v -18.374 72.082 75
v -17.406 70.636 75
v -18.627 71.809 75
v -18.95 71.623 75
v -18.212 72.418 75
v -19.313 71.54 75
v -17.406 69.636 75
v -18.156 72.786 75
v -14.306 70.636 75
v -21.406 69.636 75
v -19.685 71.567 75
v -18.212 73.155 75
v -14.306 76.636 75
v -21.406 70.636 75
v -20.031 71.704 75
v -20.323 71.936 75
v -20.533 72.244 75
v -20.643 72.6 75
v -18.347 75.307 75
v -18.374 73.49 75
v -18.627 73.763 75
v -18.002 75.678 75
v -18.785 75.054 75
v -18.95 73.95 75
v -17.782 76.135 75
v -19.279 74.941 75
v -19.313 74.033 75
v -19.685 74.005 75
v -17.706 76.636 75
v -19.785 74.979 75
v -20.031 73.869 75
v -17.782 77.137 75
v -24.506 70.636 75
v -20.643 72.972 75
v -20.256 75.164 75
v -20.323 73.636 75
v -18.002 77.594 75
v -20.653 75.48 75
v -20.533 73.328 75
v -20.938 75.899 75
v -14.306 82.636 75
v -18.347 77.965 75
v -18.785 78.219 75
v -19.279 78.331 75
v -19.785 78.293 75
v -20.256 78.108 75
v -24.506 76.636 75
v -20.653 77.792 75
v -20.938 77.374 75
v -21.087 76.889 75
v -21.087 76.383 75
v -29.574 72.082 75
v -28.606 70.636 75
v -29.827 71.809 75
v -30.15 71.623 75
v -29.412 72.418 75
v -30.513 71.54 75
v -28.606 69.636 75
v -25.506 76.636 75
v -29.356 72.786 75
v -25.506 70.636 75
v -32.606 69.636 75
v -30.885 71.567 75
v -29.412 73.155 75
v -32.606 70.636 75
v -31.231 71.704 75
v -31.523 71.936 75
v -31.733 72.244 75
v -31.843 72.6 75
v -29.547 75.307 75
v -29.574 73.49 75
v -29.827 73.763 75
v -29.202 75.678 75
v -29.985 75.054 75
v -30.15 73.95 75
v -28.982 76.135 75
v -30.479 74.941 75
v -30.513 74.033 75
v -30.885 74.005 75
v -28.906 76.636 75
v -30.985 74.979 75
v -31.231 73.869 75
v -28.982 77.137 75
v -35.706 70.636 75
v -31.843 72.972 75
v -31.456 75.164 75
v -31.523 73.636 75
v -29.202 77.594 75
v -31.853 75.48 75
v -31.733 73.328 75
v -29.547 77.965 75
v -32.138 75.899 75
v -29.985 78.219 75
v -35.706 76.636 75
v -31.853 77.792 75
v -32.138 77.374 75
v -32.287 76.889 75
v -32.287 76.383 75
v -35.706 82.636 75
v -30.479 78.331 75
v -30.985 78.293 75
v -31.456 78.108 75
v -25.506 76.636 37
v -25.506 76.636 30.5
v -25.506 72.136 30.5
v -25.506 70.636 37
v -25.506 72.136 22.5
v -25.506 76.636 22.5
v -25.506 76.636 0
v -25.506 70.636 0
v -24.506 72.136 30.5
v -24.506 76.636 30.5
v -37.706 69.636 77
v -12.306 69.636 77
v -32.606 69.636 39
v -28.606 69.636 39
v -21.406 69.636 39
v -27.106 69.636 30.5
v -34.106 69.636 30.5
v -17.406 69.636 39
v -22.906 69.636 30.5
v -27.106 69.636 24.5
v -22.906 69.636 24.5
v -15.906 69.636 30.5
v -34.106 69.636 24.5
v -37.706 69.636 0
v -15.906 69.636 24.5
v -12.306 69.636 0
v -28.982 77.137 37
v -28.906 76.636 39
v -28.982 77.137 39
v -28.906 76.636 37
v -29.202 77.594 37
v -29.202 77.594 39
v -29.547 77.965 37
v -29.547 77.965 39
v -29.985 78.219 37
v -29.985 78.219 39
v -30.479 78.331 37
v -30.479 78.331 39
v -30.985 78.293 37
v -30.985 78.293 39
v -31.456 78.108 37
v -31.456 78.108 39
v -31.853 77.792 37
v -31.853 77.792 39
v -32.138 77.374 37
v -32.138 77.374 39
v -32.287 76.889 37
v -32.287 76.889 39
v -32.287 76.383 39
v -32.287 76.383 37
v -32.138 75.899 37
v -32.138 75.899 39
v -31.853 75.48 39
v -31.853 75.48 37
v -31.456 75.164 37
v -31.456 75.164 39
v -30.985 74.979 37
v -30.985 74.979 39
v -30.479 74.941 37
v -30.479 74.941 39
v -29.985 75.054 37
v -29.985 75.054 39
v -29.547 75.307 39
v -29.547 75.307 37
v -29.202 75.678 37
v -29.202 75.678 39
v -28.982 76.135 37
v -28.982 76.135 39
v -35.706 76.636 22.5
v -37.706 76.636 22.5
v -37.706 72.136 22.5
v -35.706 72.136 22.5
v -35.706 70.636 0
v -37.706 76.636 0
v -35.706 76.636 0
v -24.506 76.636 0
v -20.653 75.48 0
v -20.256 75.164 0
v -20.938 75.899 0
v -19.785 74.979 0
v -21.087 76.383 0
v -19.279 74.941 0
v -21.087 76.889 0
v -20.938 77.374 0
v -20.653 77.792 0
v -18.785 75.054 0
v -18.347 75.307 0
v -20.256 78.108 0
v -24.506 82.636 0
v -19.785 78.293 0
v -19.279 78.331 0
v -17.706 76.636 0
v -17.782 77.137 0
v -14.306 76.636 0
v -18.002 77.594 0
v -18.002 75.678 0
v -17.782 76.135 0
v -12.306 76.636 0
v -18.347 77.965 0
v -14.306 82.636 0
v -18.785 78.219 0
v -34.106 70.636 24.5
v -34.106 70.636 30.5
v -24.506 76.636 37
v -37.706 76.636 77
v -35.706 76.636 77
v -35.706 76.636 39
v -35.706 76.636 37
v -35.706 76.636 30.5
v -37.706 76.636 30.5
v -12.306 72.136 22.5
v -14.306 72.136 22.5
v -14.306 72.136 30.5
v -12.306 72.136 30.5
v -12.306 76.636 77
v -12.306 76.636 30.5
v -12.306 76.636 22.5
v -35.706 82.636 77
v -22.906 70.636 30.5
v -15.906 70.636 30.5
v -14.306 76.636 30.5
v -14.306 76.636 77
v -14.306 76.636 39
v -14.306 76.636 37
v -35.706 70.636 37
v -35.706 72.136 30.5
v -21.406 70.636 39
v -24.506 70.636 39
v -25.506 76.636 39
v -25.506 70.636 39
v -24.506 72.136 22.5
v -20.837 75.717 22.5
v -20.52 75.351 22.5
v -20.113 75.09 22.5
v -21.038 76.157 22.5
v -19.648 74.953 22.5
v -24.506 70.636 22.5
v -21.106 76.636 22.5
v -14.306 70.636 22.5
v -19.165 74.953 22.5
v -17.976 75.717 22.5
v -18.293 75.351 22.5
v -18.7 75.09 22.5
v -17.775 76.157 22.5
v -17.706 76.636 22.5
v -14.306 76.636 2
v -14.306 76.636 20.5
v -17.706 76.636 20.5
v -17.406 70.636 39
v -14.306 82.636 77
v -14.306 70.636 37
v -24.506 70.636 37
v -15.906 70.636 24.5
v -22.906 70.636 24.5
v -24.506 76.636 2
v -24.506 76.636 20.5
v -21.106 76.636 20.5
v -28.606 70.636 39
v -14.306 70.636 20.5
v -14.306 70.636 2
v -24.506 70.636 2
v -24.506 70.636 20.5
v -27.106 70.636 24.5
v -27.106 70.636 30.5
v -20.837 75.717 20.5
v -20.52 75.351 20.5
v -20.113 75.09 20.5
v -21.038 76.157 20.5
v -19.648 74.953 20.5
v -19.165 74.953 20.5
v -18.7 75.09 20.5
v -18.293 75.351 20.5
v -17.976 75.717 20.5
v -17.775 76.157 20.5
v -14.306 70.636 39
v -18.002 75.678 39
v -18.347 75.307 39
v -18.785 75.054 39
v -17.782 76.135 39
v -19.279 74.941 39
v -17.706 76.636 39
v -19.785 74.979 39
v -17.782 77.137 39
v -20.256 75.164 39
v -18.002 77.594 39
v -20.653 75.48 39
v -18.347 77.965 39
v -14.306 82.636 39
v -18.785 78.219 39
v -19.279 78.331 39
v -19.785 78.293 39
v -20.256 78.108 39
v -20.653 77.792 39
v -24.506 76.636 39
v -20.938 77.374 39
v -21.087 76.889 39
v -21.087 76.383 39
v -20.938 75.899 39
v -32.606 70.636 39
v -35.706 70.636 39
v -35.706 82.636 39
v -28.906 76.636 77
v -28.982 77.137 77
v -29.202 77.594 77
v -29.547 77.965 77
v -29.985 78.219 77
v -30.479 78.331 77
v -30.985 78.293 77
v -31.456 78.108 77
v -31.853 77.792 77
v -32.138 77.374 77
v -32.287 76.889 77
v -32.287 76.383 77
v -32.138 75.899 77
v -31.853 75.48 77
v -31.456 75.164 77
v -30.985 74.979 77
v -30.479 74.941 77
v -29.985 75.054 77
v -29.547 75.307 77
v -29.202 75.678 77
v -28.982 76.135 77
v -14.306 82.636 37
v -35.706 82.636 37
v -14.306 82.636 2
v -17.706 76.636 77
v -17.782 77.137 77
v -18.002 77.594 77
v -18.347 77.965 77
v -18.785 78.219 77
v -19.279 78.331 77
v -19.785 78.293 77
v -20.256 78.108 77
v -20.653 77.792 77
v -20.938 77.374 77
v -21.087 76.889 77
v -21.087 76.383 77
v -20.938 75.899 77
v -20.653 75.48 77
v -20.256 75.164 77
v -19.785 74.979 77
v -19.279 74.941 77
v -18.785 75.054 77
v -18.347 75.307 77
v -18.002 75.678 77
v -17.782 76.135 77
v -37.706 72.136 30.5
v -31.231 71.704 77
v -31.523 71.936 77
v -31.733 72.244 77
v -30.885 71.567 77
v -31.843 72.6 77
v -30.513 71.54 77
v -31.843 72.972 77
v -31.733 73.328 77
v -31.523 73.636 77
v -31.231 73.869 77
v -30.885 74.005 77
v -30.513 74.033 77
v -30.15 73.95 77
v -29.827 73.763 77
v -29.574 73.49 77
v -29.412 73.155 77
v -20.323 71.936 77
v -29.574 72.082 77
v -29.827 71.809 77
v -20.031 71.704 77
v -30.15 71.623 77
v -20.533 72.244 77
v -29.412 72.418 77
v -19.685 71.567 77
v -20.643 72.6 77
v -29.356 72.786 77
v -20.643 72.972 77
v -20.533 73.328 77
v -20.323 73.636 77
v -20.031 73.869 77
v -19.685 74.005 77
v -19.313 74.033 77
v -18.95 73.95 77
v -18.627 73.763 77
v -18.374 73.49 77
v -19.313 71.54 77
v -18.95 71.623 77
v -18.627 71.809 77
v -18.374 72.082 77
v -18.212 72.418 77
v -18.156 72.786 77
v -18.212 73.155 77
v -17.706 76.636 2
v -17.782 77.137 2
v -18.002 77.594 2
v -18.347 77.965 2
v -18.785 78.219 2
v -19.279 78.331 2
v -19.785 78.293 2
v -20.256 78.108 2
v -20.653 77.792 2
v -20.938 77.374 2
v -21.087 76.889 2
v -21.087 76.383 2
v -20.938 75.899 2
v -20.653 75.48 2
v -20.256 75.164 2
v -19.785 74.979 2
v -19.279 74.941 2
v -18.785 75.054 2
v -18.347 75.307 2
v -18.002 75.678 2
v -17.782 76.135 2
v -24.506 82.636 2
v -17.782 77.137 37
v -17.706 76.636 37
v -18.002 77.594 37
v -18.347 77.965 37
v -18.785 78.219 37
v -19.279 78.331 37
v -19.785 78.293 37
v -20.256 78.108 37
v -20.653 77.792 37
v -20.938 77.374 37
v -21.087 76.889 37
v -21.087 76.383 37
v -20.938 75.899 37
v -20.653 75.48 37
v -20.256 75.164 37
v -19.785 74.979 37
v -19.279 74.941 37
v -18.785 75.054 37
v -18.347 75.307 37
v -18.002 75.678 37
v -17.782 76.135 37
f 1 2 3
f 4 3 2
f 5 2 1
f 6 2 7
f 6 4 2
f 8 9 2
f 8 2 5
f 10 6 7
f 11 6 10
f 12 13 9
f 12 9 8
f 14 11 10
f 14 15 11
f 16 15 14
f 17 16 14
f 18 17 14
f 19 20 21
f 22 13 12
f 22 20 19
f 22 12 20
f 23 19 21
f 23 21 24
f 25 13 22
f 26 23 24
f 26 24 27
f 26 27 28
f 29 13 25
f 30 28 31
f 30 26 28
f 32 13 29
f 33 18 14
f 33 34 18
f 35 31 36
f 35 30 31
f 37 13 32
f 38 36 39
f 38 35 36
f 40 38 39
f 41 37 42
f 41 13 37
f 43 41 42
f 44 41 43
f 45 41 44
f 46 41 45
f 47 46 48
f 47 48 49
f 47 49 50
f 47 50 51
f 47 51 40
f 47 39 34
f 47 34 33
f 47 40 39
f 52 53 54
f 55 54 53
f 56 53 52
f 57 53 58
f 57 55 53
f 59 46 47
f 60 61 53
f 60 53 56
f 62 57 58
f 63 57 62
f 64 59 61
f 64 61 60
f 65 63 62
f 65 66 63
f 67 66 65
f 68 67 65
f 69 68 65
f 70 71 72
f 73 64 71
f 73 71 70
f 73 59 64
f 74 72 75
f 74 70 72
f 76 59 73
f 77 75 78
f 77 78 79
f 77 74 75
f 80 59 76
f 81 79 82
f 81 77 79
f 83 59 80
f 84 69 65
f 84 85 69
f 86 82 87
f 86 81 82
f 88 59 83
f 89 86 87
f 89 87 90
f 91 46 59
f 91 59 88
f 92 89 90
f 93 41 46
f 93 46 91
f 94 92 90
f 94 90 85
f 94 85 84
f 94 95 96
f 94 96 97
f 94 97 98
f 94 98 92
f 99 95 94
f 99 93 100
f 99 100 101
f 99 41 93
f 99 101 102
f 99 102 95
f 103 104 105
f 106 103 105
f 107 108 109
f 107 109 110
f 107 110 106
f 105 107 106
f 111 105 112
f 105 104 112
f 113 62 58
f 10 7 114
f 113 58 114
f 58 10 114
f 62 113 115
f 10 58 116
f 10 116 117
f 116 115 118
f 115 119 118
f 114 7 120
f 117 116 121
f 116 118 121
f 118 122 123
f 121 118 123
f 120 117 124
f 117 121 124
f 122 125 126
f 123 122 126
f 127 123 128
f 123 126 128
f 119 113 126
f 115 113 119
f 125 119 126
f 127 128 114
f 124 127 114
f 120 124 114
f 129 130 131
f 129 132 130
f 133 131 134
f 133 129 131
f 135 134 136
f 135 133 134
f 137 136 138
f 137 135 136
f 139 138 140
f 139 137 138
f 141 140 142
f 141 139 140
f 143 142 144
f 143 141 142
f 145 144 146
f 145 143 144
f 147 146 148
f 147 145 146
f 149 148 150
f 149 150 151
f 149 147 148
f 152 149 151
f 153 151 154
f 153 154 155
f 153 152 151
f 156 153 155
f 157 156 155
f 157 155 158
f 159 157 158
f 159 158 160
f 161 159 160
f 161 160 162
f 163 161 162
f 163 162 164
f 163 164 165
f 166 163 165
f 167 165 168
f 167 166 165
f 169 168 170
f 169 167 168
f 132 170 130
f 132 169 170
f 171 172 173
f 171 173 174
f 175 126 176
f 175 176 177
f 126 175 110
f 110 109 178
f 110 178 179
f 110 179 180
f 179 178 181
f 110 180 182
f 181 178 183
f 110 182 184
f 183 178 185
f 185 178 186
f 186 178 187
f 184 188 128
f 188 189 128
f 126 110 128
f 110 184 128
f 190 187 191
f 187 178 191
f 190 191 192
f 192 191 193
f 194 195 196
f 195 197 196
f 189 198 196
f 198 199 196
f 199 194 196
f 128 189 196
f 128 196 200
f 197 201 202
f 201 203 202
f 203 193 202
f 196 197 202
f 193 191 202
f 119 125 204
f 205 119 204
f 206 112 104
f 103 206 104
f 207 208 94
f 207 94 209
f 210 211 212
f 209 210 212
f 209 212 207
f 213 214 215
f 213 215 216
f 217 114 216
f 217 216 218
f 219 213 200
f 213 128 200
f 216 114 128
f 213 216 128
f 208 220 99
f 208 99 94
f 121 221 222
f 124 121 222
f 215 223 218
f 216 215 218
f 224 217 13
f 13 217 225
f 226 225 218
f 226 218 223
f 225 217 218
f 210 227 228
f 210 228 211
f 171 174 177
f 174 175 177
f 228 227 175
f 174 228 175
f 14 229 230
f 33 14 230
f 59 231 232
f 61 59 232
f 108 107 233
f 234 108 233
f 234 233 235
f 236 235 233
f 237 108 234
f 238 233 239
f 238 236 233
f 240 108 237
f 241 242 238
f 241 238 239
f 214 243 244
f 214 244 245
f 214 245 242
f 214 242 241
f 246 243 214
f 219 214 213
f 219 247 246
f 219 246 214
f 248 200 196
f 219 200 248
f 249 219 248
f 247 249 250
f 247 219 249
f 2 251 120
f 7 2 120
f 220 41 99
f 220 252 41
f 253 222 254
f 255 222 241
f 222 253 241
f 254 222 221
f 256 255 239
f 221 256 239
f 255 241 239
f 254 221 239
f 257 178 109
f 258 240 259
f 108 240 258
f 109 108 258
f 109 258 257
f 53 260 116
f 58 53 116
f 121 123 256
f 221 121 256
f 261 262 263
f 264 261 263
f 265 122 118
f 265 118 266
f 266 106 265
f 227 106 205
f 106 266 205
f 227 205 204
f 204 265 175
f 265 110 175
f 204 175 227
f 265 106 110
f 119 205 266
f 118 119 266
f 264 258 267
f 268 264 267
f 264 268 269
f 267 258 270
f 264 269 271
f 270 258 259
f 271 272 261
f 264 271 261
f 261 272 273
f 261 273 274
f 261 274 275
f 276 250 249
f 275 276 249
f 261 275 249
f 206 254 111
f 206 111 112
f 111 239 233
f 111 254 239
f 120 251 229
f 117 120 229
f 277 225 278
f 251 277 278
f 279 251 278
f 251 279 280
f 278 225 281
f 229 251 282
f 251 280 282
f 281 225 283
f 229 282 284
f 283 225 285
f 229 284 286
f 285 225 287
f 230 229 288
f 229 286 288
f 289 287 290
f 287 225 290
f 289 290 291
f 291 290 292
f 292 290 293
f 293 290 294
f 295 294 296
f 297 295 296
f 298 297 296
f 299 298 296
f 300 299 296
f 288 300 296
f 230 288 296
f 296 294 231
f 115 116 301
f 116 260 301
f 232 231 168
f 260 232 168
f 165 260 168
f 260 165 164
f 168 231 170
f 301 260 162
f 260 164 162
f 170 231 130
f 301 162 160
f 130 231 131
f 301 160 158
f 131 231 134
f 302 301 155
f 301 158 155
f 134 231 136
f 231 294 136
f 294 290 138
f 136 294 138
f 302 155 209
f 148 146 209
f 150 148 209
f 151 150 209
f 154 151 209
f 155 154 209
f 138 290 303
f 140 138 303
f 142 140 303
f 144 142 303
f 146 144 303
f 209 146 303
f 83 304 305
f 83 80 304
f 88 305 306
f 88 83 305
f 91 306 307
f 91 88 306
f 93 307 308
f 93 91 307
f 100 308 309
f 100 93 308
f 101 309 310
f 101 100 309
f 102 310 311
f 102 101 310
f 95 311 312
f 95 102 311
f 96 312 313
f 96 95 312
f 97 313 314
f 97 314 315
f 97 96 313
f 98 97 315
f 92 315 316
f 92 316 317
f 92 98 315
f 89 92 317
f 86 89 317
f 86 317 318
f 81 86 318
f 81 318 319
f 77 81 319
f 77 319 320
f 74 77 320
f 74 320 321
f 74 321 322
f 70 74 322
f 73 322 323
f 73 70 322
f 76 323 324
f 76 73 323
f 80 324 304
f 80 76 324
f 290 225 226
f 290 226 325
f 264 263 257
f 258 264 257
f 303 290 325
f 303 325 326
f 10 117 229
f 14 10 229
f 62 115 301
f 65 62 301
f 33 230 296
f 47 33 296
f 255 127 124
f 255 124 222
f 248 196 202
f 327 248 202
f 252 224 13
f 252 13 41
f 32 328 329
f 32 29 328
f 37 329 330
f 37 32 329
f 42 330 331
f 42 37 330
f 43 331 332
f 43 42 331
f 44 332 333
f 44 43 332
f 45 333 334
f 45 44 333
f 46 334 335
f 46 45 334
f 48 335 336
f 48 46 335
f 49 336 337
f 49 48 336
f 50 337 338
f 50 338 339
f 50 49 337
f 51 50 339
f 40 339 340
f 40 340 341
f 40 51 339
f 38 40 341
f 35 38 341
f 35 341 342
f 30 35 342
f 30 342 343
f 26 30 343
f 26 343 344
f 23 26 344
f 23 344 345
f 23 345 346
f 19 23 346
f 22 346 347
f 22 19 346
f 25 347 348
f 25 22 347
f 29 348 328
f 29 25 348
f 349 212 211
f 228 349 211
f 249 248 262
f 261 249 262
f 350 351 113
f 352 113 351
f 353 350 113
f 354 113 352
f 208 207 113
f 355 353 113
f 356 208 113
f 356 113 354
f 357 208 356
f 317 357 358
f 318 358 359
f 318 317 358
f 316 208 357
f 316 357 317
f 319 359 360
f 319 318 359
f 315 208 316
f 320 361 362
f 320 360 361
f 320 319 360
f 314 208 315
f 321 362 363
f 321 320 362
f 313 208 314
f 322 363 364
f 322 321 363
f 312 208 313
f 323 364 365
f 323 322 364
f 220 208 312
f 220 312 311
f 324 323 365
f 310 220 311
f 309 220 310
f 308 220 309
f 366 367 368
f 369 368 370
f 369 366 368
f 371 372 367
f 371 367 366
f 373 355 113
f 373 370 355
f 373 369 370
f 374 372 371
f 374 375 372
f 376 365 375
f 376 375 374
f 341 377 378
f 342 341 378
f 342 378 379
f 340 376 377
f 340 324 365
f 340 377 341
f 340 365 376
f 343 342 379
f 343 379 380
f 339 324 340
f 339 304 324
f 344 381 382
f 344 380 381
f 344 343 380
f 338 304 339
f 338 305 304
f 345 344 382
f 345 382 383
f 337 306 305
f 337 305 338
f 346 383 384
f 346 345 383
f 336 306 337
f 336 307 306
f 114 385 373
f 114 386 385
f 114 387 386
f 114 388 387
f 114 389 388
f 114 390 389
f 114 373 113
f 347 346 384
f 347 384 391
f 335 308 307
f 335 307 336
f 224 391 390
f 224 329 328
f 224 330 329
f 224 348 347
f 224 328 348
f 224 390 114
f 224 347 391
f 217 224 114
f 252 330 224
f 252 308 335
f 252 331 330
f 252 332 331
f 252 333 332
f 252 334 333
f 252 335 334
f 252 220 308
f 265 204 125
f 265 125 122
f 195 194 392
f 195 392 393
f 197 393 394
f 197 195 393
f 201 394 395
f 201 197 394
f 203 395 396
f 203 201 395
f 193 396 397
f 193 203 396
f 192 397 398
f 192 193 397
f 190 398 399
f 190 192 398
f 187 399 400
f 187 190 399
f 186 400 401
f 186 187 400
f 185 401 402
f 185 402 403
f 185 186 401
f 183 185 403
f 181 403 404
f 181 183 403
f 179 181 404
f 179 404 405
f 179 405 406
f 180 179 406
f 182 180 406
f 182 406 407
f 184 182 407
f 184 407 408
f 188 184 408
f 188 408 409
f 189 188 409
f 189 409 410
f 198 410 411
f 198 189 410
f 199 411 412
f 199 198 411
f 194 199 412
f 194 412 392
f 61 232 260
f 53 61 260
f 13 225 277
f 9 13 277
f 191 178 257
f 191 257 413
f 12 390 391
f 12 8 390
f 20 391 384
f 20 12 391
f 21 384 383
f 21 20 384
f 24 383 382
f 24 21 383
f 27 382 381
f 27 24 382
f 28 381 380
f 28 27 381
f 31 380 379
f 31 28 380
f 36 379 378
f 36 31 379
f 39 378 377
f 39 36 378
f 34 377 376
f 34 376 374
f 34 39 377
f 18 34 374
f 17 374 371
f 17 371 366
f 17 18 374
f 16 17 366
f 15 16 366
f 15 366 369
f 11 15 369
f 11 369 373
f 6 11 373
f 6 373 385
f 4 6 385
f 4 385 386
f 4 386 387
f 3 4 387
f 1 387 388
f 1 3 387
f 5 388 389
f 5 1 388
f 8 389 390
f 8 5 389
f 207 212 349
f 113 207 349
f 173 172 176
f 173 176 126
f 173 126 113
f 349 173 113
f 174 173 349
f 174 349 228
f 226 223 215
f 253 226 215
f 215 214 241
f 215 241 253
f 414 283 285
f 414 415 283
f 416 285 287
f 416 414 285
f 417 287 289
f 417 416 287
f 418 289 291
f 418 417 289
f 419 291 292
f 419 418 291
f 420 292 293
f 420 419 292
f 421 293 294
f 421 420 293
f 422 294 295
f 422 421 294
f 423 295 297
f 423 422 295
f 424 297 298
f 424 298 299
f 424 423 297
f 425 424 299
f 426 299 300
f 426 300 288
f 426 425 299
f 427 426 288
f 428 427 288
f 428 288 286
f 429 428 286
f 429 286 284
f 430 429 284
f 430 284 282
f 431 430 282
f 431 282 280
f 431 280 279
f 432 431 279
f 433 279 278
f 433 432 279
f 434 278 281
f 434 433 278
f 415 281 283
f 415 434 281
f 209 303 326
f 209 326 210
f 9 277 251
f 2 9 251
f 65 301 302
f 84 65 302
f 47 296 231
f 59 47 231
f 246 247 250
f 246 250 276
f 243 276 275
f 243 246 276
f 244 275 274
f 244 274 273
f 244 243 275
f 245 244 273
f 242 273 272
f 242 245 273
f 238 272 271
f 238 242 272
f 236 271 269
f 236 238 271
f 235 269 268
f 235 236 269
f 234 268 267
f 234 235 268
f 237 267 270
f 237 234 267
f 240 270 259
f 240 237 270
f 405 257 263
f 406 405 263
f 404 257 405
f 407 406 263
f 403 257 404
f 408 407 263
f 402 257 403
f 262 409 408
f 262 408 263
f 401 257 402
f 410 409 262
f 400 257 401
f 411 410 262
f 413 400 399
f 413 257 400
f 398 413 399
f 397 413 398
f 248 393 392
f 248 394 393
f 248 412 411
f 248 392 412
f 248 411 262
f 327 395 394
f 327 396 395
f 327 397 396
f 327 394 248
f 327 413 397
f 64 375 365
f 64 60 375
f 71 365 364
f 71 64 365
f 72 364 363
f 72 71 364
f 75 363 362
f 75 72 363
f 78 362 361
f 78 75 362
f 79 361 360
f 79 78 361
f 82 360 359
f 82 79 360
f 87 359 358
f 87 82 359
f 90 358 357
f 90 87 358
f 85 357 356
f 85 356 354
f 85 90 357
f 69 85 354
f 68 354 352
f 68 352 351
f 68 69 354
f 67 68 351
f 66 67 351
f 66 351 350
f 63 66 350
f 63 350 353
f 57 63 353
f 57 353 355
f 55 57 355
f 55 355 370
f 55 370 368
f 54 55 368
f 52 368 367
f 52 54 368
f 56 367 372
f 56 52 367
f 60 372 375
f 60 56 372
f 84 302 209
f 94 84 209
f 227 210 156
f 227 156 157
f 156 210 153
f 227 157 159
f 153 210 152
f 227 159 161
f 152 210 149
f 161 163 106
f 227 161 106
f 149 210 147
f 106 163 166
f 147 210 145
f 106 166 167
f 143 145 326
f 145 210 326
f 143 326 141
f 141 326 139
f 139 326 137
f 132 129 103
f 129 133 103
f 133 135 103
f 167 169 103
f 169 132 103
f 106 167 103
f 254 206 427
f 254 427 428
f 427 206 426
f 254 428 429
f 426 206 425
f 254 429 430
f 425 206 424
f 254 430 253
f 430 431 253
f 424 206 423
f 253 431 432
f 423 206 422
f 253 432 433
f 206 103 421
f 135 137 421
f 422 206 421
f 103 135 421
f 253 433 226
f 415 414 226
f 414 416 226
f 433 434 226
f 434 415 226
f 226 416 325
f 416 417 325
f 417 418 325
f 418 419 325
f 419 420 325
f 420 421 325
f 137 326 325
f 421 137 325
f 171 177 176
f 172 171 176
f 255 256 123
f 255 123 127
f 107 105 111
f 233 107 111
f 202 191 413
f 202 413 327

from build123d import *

# Parameters (mm, degrees)
GEARBOX_MOUNT_DEPTH  = 77
BOSS_EXTRUDE6_START  = 38
SKETCH7_R            = 1.7
SKETCH7_W            = 1
SKETCH7_H            = 6
BOSS_EXTRUDE6_DEPTH  = 1
BOSS_EXTRUDE7_START  = 76
SKETCH8_R            = 1.25
SKETCH8_R_2          = 1.7
SKETCH8_W            = 1
SKETCH8_H            = 6
BOSS_EXTRUDE7_DEPTH  = 1
CUT_EXTRUDE1_START   = 22.5
CUT_EXTRUDE1_DEPTH   = 8
BOSS_EXTRUDE9_START  = 22.5
BOSS_EXTRUDE9_DEPTH  = 2
SKETCH12_W           = 10.2
SKETCH12_H           = 12
SKETCH12_R           = 1.7
BOSS_EXTRUDE10_DEPTH = 2
CUT_EXTRUDE2_START   = 24.5
SKETCH9_W            = 7
SKETCH9_H            = 1
CUT_EXTRUDE2_DEPTH   = 6
CUT_EXTRUDE3_START   = 39
CUT_EXTRUDE3_DEPTH   = 36


with BuildPart() as part:
    # Sketch2 → Gearbox Mount (new body)
    with BuildSketch(Plane.XY):
        Polygon((-24.506477671, 70.636122542), (-24.506477671, 76.636122542), (-25.506477671, 76.636122542), (-25.506477671, 70.636122542), (-35.706477671, 70.636122542), (-35.706477671, 76.636122542), (-37.706477671, 76.636122542), (-37.706477671, 69.636122542), (-12.306477671, 69.636122542), (-12.306477671, 76.636122542), (-14.306477671, 76.636122542), (-14.306477671, 70.636122542), align=None)
    extrude(amount=GEARBOX_MOUNT_DEPTH)

    # Sketch7 → Boss-Extrude6 (add, symmetric)
    with BuildSketch(Plane.XY.offset(BOSS_EXTRUDE6_START)):
        Polygon((-24.506477671, 76.636122542), (-24.506477671, 70.636122542), (-14.306477671, 70.636122542), (-14.306477671, 76.636122542), (-14.306477671, 82.636122542), (-24.506477671, 82.636122542), align=None)
        with Locations((-19.406477671, 76.636122542)):
            Circle(SKETCH7_R, mode=Mode.SUBTRACT)
        with Locations((-25.006477671, 79.636122542)):
            Rectangle(SKETCH7_W, SKETCH7_H)
        Polygon((-25.506477671, 70.636122542), (-25.506477671, 76.636122542), (-25.506477671, 82.636122542), (-35.706477671, 82.636122542), (-35.706477671, 70.636122542), align=None)
        with Locations((-30.606477671, 76.636122542)):
            Circle(SKETCH7_R, mode=Mode.SUBTRACT)
    extrude(amount=BOSS_EXTRUDE6_DEPTH, both=True)

    # Sketch8 → Boss-Extrude7 (add, symmetric)
    with BuildSketch(Plane.XY.offset(BOSS_EXTRUDE7_START)):
        Polygon((-35.706477671, 82.636122542), (-35.706477671, 70.636122542), (-25.506477671, 70.636122542), (-25.506477671, 76.636122542), (-25.506477671, 82.636122542), align=None)
        with Locations((-30.606477671, 72.786122542)):
            Circle(SKETCH8_R, mode=Mode.SUBTRACT)
        with Locations((-30.606477671, 76.636122542)):
            Circle(SKETCH8_R_2, mode=Mode.SUBTRACT)
        with Locations((-25.006477671, 79.636122542)):
            Rectangle(SKETCH8_W, SKETCH8_H)
        Polygon((-14.306477671, 82.636122542), (-24.506477671, 82.636122542), (-24.506477671, 76.636122542), (-24.506477671, 70.636122542), (-14.306477671, 70.636122542), (-14.306477671, 76.636122542), align=None)
        with Locations((-19.406477671, 72.786122542)):
            Circle(SKETCH8_R, mode=Mode.SUBTRACT)
        with Locations((-19.406477671, 76.636122542)):
            Circle(SKETCH8_R_2, mode=Mode.SUBTRACT)
    extrude(amount=BOSS_EXTRUDE7_DEPTH, both=True)

    # Sketch10 → Cut-Extrude1 (cut)
    with BuildSketch(Plane.XY.offset(CUT_EXTRUDE1_START)):
        Polygon((-14.306477671, 70.636122542), (-14.306477671, 72.136122542), (-12.306477671, 72.136122542), (-12.306477671, 82.636122542), (-37.706477671, 82.636122542), (-37.706477671, 72.136122542), (-35.706477671, 72.136122542), (-35.706477671, 70.636122542), (-25.506477671, 70.636122542), (-25.506477671, 72.136122542), (-24.506477671, 72.136122542), (-24.506477671, 70.636122542), align=None)
    extrude(amount=CUT_EXTRUDE1_DEPTH, mode=Mode.SUBTRACT)

    # Sketch11 → Boss-Extrude9 (add)
    with BuildSketch(Plane.XY.offset(BOSS_EXTRUDE9_START)):
        with BuildLine():
            Line((-24.506477671, 76.636122542), (-24.506477671, 70.636122542))
            Line((-24.506477671, 70.636122542), (-14.306477671, 70.636122542))
            Line((-14.306477671, 70.636122542), (-14.306477671, 76.636122542))
            Line((-14.306477671, 76.636122542), (-17.706477671, 76.636122542))
            ThreePointArc((-17.706477671, 76.636122542), (-19.406477671, 74.936122542), (-21.106477671, 76.636122542))
            Line((-21.106477671, 76.636122542), (-24.506477671, 76.636122542))
        make_face()
    extrude(amount=-BOSS_EXTRUDE9_DEPTH)

    # Sketch12 → Boss-Extrude10 (add)
    with BuildSketch(Plane.XY):
        with Locations((-19.406477671, 76.636122542)):
            Rectangle(SKETCH12_W, SKETCH12_H)
        with Locations((-19.406477671, 76.636122542)):
            Circle(SKETCH12_R, mode=Mode.SUBTRACT)
    extrude(amount=BOSS_EXTRUDE10_DEPTH)

    # Sketch9 → Cut-Extrude2 (cut)
    with BuildSketch(Plane.XY.offset(CUT_EXTRUDE2_START)):
        with Locations((-30.606477671, 70.136122542)):
            Rectangle(SKETCH9_W, SKETCH9_H)
        with Locations((-19.406477671, 70.136122542)):
            Rectangle(SKETCH9_W, SKETCH9_H)
    extrude(amount=CUT_EXTRUDE2_DEPTH, mode=Mode.SUBTRACT)

    # Sketch13 → Cut-Extrude3 (cut)
    with BuildSketch(Plane.XY.offset(CUT_EXTRUDE3_START)):
        Polygon((-19.406477671, 69.636122542), (-21.406477671, 69.636122542), (-21.406477671, 70.636122542), (-17.406477671, 70.636122542), (-17.406477671, 69.636122542), align=None)
        Polygon((-30.606477671, 69.636122542), (-32.606477671, 69.636122542), (-32.606477671, 70.636122542), (-28.606477671, 70.636122542), (-28.606477671, 69.636122542), align=None)
    extrude(amount=CUT_EXTRUDE3_DEPTH, mode=Mode.SUBTRACT)


solid = part.part
